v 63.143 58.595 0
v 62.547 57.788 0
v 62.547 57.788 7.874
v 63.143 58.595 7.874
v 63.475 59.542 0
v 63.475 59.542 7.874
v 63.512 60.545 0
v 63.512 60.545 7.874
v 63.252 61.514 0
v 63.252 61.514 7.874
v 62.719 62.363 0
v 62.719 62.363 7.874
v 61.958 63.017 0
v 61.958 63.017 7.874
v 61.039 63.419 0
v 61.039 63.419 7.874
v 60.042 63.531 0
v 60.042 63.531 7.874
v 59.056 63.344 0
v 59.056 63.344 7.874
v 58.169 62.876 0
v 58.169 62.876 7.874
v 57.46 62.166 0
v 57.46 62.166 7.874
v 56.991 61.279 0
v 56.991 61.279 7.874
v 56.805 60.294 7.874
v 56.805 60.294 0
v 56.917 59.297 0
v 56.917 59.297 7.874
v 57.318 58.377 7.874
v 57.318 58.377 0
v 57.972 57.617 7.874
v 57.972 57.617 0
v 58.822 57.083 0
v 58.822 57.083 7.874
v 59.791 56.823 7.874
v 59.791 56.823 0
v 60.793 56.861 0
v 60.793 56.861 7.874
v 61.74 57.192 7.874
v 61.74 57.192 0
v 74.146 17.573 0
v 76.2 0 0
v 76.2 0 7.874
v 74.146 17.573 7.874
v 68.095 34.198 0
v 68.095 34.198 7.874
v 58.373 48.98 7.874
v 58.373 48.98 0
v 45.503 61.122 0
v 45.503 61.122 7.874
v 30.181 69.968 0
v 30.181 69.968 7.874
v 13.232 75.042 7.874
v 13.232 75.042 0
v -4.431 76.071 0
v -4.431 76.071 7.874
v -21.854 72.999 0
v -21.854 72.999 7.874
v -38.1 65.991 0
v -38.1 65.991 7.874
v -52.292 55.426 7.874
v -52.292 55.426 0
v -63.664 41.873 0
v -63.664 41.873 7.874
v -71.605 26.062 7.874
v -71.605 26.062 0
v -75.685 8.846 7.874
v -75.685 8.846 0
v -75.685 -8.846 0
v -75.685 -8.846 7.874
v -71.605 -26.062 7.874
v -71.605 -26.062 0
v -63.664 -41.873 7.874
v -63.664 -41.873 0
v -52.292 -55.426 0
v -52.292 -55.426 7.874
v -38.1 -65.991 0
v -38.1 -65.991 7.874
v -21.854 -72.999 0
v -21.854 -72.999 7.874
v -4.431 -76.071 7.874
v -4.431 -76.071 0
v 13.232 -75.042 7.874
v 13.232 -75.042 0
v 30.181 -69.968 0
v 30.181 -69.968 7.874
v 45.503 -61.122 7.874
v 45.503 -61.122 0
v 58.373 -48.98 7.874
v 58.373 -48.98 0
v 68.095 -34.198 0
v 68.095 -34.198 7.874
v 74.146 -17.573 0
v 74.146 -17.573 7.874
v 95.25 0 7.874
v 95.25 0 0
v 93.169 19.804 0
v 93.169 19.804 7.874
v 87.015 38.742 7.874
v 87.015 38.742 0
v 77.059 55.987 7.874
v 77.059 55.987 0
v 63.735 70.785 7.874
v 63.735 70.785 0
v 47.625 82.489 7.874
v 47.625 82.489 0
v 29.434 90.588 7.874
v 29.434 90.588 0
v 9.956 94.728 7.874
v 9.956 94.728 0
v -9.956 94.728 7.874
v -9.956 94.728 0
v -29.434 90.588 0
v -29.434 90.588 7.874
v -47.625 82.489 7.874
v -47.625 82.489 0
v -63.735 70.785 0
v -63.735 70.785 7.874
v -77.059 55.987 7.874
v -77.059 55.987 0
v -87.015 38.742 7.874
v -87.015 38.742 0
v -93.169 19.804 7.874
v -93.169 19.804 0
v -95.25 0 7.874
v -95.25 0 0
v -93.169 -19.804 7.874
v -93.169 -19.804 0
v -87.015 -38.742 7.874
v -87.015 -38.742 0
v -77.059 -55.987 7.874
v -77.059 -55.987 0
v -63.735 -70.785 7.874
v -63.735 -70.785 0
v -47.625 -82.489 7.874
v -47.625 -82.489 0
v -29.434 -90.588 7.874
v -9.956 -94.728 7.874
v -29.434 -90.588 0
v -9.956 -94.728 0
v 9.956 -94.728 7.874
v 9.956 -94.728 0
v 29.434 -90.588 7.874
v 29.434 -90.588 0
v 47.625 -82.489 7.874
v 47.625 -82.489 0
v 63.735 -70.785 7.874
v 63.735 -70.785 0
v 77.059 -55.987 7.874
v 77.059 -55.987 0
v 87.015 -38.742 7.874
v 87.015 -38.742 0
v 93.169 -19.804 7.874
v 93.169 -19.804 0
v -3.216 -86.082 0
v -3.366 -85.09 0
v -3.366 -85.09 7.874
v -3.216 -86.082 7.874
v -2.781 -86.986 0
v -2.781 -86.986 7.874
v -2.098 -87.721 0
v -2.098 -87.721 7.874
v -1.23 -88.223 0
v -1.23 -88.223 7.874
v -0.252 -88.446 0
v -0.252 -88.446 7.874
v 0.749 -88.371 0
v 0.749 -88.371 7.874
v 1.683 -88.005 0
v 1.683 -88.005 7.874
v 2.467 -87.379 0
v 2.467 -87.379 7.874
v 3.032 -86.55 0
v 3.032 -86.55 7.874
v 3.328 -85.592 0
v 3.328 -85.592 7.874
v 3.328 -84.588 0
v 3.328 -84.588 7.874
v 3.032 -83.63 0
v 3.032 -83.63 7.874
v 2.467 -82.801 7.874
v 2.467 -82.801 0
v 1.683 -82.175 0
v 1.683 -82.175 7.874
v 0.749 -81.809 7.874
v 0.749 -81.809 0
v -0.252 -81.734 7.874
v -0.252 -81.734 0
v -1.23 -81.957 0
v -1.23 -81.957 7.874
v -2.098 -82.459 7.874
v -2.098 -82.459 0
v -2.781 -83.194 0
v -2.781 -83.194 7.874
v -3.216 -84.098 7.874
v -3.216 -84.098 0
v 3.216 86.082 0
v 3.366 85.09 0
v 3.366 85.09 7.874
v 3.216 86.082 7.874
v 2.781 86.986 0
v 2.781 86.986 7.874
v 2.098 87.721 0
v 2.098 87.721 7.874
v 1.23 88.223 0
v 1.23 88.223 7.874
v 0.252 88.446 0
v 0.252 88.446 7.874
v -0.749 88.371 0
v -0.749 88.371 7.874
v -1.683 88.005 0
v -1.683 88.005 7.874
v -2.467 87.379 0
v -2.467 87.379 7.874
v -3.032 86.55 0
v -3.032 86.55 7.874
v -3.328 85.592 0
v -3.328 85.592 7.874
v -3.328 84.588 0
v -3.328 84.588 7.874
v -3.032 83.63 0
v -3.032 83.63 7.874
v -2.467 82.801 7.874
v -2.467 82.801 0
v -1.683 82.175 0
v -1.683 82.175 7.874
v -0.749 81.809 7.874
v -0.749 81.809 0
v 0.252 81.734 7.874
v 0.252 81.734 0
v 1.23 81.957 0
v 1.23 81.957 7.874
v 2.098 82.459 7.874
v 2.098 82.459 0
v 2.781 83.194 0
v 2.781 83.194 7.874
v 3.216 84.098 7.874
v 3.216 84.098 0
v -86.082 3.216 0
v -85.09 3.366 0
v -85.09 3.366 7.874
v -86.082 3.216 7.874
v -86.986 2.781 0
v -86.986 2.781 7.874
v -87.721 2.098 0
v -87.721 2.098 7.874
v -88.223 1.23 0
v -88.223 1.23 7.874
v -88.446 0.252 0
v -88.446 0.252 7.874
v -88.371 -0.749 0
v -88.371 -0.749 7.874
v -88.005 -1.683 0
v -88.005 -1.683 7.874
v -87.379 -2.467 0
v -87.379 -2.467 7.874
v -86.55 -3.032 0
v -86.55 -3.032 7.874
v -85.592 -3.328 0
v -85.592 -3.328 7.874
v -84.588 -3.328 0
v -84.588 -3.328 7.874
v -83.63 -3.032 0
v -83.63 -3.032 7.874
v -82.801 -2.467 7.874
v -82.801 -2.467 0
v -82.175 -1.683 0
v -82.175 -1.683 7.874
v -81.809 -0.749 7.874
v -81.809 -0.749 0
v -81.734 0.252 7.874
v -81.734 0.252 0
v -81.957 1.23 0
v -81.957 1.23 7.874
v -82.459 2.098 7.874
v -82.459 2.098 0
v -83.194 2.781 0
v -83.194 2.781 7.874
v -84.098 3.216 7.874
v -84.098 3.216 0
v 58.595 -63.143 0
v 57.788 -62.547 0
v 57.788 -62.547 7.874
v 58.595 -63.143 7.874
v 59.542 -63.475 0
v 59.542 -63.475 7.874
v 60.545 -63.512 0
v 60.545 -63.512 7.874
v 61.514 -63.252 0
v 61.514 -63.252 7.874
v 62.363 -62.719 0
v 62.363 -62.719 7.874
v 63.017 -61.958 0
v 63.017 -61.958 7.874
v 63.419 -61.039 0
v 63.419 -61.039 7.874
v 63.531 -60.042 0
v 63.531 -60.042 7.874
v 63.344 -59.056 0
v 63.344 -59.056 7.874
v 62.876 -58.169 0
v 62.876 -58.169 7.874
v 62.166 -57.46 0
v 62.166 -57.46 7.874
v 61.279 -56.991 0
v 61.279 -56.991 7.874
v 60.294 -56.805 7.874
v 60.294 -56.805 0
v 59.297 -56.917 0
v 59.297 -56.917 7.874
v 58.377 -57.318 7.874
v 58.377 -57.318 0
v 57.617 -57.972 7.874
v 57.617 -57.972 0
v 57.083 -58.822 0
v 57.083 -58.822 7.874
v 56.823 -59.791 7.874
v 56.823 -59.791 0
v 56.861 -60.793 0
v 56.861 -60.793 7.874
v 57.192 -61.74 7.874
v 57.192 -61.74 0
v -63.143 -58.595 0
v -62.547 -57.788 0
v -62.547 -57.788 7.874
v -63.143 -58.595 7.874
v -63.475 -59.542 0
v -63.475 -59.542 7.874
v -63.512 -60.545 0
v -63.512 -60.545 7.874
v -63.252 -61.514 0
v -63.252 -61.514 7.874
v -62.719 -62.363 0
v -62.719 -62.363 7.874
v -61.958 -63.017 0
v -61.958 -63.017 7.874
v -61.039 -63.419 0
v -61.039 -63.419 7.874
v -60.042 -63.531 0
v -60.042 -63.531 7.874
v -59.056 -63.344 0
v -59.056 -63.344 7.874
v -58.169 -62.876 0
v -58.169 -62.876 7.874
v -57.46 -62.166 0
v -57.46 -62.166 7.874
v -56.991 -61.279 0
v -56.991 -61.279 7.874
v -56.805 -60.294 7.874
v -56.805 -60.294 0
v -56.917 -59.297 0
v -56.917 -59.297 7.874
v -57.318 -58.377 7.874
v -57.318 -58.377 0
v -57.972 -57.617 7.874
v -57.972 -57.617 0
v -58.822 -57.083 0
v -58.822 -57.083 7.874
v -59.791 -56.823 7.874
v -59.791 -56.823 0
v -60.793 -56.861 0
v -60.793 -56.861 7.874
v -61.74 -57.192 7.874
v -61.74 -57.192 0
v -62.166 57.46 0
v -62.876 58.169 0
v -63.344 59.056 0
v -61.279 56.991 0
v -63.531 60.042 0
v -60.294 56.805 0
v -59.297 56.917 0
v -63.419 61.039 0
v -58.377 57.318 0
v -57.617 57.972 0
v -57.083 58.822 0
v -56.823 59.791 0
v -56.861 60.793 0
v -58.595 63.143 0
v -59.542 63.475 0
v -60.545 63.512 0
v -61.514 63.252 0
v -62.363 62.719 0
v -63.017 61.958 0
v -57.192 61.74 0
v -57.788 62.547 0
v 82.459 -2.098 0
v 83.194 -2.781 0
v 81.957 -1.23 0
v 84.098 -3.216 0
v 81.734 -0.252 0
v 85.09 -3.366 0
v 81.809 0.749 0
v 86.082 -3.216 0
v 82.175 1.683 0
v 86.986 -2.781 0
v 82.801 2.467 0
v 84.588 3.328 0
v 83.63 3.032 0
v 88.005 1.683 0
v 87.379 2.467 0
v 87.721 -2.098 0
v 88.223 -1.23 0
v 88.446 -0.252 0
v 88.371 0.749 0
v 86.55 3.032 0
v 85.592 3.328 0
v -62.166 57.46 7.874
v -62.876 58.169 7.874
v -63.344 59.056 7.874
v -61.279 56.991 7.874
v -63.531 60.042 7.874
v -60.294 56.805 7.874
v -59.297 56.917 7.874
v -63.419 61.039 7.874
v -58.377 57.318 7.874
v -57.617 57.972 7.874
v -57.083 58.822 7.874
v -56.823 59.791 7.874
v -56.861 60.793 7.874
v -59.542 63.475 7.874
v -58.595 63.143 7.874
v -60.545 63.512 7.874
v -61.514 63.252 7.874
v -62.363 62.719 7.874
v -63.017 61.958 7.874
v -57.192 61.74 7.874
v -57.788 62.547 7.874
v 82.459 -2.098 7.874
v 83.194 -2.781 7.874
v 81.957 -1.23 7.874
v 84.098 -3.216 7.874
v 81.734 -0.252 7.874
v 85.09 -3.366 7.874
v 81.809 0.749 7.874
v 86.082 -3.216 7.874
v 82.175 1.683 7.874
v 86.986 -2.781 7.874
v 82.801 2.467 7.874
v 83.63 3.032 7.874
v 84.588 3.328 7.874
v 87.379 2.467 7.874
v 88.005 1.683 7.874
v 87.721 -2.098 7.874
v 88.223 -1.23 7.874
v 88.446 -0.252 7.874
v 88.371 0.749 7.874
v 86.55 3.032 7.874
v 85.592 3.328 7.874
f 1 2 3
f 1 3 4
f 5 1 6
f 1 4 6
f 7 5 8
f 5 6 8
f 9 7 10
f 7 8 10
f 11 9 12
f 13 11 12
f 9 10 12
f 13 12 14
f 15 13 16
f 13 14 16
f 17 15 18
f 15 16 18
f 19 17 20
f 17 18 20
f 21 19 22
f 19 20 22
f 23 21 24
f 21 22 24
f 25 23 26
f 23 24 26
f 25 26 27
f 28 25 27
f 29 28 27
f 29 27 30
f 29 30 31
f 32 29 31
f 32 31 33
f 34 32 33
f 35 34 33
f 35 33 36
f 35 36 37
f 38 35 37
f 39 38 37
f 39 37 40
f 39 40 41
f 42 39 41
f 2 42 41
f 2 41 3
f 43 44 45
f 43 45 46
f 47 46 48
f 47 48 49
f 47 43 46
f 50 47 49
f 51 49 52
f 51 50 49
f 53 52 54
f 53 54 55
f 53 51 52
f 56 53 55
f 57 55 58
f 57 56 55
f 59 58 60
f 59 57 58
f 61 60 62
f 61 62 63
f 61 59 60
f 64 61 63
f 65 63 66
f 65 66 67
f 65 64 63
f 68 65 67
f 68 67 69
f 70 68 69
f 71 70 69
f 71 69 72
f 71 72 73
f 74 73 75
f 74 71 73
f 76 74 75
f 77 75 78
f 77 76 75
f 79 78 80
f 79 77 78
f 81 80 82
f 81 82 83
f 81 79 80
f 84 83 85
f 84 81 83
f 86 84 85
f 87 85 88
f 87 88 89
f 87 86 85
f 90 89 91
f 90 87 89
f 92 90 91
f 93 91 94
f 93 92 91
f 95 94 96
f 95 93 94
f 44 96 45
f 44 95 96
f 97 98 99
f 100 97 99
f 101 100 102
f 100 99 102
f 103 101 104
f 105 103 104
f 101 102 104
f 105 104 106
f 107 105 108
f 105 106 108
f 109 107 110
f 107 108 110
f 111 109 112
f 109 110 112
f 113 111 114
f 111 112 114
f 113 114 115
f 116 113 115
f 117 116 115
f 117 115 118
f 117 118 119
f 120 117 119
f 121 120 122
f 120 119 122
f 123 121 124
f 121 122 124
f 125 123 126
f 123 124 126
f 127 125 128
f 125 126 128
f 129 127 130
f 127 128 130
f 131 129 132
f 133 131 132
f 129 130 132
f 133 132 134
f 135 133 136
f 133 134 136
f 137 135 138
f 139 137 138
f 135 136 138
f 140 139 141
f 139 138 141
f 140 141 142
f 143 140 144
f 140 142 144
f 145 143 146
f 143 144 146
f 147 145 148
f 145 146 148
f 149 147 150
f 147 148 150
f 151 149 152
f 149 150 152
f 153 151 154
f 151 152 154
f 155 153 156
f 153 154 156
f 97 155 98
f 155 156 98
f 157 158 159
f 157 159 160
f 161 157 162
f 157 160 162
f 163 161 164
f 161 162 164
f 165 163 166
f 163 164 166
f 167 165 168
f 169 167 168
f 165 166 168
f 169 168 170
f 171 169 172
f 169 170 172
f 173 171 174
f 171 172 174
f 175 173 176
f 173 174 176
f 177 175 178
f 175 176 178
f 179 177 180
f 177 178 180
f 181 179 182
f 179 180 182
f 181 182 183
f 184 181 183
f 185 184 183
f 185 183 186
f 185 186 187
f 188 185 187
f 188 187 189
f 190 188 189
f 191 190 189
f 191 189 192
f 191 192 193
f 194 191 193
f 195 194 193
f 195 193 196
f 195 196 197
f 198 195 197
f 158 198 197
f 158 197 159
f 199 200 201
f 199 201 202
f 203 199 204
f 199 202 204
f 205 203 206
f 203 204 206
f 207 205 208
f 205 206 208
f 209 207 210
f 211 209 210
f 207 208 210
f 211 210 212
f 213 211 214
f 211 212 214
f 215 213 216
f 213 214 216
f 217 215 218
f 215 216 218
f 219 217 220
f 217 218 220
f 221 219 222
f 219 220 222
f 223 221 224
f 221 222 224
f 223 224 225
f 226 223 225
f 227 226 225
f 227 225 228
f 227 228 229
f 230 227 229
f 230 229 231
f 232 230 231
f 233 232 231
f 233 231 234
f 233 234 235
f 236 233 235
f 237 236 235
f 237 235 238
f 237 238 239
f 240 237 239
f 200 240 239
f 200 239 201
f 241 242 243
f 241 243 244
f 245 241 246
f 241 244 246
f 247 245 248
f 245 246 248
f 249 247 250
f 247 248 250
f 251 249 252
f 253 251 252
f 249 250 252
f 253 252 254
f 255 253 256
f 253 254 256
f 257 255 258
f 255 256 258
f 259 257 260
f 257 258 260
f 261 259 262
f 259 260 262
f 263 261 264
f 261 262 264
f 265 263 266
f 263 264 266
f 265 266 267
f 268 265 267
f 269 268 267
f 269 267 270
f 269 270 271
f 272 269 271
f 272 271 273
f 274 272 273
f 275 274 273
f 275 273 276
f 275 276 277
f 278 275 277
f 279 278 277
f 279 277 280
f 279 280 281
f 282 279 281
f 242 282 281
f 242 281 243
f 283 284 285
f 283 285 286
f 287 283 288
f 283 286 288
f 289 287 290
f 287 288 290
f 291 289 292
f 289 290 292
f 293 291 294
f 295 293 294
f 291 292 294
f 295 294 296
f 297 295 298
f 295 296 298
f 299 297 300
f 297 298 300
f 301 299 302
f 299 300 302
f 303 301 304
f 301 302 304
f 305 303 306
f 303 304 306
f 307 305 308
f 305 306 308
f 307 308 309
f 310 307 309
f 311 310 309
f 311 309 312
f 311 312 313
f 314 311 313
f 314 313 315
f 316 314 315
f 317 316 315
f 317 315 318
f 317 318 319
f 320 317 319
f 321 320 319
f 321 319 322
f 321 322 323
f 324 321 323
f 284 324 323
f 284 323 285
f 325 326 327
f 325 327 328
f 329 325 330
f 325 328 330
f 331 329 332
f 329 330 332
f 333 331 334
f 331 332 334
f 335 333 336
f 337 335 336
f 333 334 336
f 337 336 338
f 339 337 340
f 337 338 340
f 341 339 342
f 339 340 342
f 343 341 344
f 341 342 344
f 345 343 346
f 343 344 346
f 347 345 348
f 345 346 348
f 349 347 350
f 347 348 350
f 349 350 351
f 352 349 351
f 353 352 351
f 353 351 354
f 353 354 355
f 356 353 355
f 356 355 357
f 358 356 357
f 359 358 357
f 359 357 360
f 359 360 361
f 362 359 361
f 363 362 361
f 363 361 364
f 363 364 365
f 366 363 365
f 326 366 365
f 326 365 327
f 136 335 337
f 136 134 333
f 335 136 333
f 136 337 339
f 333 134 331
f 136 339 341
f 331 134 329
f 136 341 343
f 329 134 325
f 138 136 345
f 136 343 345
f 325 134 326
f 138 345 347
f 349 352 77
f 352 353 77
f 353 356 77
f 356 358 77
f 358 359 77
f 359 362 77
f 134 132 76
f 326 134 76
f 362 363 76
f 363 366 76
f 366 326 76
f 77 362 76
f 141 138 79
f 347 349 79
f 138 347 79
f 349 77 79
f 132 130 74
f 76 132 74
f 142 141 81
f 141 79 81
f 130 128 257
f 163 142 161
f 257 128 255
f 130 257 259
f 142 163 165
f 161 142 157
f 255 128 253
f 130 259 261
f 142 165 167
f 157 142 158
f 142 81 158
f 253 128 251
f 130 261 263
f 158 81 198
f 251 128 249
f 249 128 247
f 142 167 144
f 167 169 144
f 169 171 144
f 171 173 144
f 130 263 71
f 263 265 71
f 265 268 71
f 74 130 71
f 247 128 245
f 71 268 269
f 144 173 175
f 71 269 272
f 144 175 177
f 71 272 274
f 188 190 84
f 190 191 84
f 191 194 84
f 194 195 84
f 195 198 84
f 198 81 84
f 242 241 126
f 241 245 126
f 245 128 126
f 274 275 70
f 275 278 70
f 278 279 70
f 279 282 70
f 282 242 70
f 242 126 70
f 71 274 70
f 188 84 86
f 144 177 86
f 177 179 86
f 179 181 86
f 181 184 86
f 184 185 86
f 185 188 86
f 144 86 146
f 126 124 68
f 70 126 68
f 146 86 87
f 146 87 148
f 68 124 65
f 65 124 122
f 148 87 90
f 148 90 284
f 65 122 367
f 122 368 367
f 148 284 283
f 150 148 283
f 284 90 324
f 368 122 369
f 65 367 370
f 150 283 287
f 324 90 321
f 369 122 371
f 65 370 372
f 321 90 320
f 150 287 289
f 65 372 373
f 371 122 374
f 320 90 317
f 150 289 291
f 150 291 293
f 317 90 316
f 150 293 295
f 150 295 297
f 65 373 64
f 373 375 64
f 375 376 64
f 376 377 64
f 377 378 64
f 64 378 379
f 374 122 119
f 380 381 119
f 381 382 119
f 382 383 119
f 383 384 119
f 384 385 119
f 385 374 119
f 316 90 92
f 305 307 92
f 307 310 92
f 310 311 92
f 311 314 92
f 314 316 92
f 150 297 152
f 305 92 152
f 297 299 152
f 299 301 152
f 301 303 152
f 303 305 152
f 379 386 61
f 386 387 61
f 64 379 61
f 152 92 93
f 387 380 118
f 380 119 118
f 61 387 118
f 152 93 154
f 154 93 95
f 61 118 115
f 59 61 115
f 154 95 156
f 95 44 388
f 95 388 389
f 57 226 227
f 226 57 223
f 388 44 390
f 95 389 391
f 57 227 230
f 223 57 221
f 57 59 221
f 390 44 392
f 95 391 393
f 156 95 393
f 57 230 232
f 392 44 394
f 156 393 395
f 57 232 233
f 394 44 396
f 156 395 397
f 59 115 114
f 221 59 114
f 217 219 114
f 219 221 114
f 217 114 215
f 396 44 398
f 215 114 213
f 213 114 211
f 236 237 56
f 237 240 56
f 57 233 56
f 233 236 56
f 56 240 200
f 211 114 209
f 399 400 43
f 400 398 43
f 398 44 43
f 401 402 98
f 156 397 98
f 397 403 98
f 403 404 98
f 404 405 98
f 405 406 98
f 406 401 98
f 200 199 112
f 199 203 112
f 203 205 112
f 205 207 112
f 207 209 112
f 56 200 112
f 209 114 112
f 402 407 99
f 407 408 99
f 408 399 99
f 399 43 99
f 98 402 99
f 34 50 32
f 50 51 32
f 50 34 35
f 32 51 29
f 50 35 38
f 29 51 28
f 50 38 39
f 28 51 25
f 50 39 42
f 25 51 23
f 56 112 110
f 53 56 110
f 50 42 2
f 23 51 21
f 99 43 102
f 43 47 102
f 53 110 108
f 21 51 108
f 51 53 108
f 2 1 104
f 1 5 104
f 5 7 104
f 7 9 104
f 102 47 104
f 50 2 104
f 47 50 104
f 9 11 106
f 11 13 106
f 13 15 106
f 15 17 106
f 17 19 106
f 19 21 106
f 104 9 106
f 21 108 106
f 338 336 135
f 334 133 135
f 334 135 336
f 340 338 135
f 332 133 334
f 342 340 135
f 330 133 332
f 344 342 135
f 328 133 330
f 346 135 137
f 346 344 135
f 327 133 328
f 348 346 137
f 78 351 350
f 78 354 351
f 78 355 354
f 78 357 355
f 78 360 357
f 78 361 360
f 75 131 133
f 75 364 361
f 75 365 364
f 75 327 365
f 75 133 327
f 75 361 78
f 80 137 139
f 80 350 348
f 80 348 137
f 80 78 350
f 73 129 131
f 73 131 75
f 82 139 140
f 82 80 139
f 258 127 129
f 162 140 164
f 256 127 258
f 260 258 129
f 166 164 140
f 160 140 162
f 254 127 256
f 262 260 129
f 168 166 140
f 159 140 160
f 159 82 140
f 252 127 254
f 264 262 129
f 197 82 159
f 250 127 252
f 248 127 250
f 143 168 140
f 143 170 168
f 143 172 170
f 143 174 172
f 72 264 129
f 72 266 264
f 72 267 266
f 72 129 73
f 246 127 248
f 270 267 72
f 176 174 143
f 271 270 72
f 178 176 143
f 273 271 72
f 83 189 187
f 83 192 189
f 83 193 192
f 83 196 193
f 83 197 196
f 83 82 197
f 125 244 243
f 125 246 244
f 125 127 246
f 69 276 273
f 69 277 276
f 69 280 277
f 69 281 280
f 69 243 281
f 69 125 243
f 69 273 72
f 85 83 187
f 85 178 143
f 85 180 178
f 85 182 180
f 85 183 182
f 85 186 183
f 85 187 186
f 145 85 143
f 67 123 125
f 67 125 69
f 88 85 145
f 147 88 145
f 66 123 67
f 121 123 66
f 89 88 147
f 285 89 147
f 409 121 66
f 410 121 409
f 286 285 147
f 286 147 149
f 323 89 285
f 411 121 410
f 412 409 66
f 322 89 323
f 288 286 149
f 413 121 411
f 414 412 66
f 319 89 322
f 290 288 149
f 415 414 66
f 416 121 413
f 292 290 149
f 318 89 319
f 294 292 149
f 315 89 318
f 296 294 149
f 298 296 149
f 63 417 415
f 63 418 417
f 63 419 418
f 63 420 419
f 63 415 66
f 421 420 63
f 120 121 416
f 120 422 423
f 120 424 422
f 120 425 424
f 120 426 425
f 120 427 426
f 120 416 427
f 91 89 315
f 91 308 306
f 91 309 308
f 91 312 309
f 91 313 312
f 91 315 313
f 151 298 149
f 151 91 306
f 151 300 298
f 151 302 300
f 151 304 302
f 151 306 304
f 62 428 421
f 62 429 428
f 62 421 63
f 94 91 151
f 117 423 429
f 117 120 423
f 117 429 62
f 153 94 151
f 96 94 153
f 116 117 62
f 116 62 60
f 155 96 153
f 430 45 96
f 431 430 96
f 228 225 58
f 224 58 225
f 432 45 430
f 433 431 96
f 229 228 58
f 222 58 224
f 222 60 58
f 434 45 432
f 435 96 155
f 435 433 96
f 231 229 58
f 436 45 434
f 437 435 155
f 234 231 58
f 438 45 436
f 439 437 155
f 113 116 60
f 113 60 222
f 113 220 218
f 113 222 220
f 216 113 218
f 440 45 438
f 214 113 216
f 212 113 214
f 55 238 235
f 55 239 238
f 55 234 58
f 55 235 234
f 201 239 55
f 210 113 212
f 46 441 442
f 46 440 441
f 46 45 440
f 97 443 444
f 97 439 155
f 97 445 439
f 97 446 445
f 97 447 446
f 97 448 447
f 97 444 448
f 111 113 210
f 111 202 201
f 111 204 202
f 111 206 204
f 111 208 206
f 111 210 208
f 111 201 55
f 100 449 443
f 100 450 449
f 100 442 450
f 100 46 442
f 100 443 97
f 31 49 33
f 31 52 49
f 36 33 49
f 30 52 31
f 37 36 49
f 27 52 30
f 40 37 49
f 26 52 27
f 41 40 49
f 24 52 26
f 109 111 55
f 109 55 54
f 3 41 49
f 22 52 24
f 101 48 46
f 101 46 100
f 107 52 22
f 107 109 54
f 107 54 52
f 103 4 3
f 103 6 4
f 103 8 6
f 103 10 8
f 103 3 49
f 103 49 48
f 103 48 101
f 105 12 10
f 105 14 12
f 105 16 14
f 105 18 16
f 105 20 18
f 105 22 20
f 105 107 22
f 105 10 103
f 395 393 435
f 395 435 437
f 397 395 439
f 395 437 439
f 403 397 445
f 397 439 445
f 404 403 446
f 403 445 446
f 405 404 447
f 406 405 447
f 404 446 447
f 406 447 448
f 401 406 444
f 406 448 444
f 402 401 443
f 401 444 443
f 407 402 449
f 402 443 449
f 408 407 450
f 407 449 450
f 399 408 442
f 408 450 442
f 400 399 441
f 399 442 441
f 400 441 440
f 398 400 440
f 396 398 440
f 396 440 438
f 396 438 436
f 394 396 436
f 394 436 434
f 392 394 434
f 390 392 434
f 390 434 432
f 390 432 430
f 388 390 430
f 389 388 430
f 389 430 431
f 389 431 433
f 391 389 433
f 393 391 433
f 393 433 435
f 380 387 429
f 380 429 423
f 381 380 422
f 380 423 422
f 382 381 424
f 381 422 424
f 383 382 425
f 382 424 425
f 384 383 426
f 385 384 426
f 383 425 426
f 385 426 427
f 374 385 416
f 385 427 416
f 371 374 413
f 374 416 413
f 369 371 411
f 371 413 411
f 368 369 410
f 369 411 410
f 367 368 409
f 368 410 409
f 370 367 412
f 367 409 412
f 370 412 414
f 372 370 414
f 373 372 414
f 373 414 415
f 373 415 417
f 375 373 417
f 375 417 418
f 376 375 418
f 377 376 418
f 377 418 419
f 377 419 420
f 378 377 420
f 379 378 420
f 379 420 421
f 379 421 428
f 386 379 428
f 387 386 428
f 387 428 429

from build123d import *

# Parameters (mm, degrees)
SKETCH1_R           = 95.25
SKETCH1_R_2         = 76.2
BOSS_EXTRUDE1_DEPTH = 7.874
SKETCH2_R           = 3.3655
CUT_EXTRUDE1_DEPTH  = 8.874
CIRPATTERN1_COUNT   = 8


with BuildPart() as part:
    # Sketch1 → Boss-Extrude1 (new body)
    with BuildSketch(Plane.XY):
        Circle(SKETCH1_R)
        Circle(SKETCH1_R_2, mode=Mode.SUBTRACT)
    extrude(amount=BOSS_EXTRUDE1_DEPTH)

    # Sketch2 → Cut-Extrude1 (cut, through all)
    with BuildSketch(Plane.XY.offset(7.874)):
        with Locations((0, 85.09)):
            Circle(SKETCH2_R)
    cut_extrude1 = extrude(amount=-CUT_EXTRUDE1_DEPTH, mode=Mode.SUBTRACT)

    # CirPattern1: Cut-Extrude1 ×8 about axis
    cirpattern1_axis = Axis((0, 0, 0), (0, 0, 1))
    for i in range(1, CIRPATTERN1_COUNT):
        add(cut_extrude1.rotate(cirpattern1_axis, i * 360 / CIRPATTERN1_COUNT), mode=Mode.SUBTRACT)


solid = part.part
